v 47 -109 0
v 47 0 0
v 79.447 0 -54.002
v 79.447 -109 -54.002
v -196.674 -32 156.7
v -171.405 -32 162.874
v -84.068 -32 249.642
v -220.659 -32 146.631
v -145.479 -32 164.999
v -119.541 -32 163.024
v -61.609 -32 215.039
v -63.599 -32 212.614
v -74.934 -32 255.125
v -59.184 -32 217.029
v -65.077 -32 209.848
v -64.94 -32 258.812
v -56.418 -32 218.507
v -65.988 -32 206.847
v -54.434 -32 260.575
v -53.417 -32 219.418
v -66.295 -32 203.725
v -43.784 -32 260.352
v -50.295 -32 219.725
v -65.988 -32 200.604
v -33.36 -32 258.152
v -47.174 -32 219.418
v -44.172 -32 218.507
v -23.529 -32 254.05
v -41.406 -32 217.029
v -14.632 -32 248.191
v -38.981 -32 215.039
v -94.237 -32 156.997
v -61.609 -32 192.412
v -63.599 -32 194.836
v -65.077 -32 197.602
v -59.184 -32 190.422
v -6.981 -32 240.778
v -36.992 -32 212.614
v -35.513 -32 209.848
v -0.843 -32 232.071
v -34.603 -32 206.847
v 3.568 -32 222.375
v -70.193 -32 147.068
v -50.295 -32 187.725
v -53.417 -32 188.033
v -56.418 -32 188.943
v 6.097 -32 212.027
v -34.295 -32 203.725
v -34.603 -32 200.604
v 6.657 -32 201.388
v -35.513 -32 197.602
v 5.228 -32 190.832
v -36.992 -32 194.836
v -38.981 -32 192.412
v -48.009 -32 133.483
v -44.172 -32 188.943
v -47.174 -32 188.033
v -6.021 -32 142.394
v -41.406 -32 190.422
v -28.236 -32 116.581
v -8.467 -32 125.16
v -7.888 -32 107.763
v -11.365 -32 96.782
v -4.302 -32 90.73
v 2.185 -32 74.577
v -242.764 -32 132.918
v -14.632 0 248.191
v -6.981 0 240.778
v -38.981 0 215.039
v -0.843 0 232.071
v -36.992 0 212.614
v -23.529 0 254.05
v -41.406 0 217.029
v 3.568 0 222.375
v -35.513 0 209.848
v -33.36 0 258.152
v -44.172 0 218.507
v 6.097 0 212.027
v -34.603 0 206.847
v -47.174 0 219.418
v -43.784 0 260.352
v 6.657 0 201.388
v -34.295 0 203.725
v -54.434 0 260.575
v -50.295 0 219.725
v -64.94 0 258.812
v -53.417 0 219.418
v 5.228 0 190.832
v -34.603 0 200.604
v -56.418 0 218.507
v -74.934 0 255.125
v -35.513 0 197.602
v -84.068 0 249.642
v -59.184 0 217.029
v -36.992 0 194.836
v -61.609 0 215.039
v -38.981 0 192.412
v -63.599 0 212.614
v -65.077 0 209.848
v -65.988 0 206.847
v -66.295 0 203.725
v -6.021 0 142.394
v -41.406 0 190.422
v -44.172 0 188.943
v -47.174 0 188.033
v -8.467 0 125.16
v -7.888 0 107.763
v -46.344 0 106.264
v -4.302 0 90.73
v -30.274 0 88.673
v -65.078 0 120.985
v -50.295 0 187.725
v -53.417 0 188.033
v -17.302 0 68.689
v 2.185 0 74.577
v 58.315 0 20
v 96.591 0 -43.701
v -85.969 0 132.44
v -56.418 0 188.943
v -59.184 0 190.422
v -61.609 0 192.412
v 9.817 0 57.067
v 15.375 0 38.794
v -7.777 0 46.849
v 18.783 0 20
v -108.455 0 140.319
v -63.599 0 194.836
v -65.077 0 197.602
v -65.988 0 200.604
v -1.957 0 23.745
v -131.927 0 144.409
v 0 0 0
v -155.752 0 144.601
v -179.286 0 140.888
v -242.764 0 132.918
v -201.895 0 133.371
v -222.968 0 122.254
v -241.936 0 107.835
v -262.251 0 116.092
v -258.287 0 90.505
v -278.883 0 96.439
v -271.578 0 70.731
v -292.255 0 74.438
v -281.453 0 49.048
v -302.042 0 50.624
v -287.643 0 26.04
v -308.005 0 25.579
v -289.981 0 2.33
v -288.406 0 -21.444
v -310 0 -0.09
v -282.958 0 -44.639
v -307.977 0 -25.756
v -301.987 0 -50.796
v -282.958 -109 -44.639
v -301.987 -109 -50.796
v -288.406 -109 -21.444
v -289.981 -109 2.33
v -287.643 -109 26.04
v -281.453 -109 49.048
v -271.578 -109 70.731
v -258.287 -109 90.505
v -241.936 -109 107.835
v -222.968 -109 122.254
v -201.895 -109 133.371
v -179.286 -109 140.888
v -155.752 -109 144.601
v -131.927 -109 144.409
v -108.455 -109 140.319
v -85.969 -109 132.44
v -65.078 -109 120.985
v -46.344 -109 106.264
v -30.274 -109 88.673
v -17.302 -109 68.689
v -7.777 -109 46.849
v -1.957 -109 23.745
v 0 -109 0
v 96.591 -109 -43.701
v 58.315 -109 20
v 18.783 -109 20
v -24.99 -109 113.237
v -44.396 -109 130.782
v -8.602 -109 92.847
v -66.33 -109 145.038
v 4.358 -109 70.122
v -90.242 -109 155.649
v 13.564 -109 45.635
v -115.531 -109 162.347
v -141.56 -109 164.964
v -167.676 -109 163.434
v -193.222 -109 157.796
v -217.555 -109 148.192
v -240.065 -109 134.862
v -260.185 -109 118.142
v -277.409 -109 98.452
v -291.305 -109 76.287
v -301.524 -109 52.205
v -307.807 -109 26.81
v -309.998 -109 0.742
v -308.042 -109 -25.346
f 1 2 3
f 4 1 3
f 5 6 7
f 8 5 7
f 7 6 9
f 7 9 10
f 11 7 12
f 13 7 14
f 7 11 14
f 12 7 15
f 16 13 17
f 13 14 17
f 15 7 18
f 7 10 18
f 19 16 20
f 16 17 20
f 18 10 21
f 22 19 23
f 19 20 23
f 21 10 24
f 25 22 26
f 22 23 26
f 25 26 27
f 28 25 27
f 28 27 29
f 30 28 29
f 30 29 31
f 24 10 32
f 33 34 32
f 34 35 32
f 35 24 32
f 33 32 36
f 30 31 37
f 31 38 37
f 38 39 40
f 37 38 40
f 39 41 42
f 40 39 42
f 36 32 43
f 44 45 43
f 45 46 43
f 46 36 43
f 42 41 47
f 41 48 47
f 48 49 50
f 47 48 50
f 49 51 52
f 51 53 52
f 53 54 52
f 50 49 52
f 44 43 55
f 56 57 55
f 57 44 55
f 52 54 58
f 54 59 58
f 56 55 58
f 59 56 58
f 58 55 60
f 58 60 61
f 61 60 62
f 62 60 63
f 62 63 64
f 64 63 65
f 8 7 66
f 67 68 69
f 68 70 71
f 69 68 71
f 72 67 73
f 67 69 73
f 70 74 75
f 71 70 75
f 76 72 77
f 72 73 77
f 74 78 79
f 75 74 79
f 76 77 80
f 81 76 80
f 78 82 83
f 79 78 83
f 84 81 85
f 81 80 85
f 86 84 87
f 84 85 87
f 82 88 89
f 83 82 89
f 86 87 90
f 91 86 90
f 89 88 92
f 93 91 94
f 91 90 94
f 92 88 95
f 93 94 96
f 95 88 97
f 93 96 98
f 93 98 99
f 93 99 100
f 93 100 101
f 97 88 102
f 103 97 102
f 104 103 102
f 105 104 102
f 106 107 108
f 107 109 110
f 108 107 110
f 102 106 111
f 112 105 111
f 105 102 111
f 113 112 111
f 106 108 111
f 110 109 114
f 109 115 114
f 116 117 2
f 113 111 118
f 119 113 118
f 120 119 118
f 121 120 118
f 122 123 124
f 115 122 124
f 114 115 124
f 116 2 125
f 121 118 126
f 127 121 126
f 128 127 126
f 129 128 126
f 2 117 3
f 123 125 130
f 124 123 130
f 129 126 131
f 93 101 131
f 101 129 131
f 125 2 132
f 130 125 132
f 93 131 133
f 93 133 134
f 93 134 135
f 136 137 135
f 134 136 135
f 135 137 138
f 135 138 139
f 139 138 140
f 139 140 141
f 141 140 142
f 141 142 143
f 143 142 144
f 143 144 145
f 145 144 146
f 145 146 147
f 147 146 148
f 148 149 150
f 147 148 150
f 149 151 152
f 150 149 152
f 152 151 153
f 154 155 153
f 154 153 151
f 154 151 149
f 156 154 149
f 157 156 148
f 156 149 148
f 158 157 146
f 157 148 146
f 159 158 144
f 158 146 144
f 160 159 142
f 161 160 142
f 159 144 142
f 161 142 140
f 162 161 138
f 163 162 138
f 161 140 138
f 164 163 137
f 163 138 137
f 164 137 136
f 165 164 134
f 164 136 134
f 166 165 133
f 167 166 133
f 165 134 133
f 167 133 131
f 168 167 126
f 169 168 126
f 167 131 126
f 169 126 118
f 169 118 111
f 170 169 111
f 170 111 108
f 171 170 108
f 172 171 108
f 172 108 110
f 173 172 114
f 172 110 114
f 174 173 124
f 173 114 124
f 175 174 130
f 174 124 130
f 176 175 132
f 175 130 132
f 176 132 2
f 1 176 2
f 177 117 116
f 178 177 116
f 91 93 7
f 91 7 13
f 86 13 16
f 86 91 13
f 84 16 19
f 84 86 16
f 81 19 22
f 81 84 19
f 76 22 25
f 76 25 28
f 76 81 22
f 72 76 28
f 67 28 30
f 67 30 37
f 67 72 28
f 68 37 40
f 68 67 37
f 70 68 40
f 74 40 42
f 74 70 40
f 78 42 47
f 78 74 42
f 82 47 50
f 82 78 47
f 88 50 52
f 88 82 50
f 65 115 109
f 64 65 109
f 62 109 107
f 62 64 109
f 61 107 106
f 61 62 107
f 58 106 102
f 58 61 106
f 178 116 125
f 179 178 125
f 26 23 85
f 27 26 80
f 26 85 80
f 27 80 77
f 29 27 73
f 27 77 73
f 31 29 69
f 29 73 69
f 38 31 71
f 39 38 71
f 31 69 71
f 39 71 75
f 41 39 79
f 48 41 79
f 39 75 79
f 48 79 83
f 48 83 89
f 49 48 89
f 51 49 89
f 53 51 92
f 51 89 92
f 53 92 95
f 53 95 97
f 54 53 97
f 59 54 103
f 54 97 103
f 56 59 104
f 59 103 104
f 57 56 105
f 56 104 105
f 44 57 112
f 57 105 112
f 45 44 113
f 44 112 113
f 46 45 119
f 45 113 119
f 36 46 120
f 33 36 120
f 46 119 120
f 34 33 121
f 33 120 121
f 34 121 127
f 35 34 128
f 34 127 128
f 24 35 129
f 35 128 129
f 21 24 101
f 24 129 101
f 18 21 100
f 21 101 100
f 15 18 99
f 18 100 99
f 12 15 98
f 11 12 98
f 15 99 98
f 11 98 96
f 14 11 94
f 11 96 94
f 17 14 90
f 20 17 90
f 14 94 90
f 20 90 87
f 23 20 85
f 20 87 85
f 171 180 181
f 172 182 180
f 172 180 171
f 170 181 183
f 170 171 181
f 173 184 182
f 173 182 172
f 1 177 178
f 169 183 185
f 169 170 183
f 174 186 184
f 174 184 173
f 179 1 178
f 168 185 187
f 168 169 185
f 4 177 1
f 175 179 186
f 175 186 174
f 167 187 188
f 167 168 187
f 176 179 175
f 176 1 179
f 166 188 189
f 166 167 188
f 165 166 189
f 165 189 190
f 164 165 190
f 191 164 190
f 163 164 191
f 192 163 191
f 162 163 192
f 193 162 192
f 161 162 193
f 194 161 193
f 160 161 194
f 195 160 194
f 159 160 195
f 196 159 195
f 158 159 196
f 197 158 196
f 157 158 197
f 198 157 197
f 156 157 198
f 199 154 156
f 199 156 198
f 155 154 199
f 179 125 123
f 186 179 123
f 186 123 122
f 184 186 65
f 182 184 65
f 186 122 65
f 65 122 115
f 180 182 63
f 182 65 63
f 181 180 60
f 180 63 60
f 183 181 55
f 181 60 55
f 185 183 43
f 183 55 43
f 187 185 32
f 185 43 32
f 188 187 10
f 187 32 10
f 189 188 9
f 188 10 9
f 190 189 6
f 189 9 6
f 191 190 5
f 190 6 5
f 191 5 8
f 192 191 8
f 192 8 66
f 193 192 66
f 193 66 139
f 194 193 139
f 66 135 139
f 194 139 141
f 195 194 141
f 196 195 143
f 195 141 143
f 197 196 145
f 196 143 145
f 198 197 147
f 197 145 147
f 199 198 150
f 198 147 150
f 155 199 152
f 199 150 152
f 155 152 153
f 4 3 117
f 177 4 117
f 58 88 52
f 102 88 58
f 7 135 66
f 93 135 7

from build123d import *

# Parameters (mm, degrees)
BOSS_EXTRUDE1_DEPTH = 109
BOSS_EXTRUDE2_DEPTH = 32
FILLET1_R           = 100
SKETCH4_R           = 16
CUT_EXTRUDE1_DEPTH  = 32


with BuildPart() as part:
    # Sketch2 → Boss-Extrude1 (new body)
    with BuildSketch(Plane(origin=(0, 0, 0), x_dir=(1, 0, 0), z_dir=(0, 1, 0))):
        with BuildLine():
            Line((0, 0), (47, 0))
            Line((47, 0), (79.447398719, 54.001539944))
            Line((79.447398719, 54.001539944), (96.590744733, 43.700778446))
            Line((96.590744733, 43.700778446), (58.315455564, -20))
            Line((58.315455564, -20), (18.783393542, -20))
            ThreePointArc((18.783393542, -20), (-180.560657841, -161.122436718), (-301.98658219, 50.79579719))
            Line((-301.98658219, 50.79579719), (-282.957905561, 44.638730864))
            ThreePointArc((-282.957905561, 44.638730864), (-167.595394372, -143.228656885), (0, 0))
        make_face()
    extrude(amount=-BOSS_EXTRUDE1_DEPTH)

    # Sketch3 → Boss-Extrude2 (add)
    with BuildSketch(Plane(origin=(0, 0, 0), x_dir=(1, 0, 0), z_dir=(0, 1, 0))):
        with BuildLine():
            Line((-242.764114638, -132.917936671), (-84.068153885, -249.642364452))
            ThreePointArc((-84.068153885, -249.642364452), (-18.943420898, -251.328541106), (5.227532222, -190.83193737))
            Line((5.227532222, -190.83193737), (-15.378785599, -102.094763712))
            ThreePointArc((-15.378785599, -102.094763712), (-122.836162355, -163.504630824), (-242.764114638, -132.917936671))
        make_face()
    extrude(amount=-BOSS_EXTRUDE2_DEPTH)

    # Fillet1
    fillet1_edges = [part.edges().sort_by_distance(p)[0] for p in [
        (-15.378785599, -16, 102.094763712),
    ]]
    fillet(fillet1_edges, radius=FILLET1_R)

    # Sketch4 → Cut-Extrude1 (cut)
    with BuildSketch(Plane(origin=(0, 0, 0), x_dir=(1, 0, 0), z_dir=(0, 1, 0))):
        with Locations(Location((-50.295096101, -203.725259056, 0), (0, 0, 270))):
            Circle(SKETCH4_R)
    extrude(amount=-CUT_EXTRUDE1_DEPTH, mode=Mode.SUBTRACT)


solid = part.part
